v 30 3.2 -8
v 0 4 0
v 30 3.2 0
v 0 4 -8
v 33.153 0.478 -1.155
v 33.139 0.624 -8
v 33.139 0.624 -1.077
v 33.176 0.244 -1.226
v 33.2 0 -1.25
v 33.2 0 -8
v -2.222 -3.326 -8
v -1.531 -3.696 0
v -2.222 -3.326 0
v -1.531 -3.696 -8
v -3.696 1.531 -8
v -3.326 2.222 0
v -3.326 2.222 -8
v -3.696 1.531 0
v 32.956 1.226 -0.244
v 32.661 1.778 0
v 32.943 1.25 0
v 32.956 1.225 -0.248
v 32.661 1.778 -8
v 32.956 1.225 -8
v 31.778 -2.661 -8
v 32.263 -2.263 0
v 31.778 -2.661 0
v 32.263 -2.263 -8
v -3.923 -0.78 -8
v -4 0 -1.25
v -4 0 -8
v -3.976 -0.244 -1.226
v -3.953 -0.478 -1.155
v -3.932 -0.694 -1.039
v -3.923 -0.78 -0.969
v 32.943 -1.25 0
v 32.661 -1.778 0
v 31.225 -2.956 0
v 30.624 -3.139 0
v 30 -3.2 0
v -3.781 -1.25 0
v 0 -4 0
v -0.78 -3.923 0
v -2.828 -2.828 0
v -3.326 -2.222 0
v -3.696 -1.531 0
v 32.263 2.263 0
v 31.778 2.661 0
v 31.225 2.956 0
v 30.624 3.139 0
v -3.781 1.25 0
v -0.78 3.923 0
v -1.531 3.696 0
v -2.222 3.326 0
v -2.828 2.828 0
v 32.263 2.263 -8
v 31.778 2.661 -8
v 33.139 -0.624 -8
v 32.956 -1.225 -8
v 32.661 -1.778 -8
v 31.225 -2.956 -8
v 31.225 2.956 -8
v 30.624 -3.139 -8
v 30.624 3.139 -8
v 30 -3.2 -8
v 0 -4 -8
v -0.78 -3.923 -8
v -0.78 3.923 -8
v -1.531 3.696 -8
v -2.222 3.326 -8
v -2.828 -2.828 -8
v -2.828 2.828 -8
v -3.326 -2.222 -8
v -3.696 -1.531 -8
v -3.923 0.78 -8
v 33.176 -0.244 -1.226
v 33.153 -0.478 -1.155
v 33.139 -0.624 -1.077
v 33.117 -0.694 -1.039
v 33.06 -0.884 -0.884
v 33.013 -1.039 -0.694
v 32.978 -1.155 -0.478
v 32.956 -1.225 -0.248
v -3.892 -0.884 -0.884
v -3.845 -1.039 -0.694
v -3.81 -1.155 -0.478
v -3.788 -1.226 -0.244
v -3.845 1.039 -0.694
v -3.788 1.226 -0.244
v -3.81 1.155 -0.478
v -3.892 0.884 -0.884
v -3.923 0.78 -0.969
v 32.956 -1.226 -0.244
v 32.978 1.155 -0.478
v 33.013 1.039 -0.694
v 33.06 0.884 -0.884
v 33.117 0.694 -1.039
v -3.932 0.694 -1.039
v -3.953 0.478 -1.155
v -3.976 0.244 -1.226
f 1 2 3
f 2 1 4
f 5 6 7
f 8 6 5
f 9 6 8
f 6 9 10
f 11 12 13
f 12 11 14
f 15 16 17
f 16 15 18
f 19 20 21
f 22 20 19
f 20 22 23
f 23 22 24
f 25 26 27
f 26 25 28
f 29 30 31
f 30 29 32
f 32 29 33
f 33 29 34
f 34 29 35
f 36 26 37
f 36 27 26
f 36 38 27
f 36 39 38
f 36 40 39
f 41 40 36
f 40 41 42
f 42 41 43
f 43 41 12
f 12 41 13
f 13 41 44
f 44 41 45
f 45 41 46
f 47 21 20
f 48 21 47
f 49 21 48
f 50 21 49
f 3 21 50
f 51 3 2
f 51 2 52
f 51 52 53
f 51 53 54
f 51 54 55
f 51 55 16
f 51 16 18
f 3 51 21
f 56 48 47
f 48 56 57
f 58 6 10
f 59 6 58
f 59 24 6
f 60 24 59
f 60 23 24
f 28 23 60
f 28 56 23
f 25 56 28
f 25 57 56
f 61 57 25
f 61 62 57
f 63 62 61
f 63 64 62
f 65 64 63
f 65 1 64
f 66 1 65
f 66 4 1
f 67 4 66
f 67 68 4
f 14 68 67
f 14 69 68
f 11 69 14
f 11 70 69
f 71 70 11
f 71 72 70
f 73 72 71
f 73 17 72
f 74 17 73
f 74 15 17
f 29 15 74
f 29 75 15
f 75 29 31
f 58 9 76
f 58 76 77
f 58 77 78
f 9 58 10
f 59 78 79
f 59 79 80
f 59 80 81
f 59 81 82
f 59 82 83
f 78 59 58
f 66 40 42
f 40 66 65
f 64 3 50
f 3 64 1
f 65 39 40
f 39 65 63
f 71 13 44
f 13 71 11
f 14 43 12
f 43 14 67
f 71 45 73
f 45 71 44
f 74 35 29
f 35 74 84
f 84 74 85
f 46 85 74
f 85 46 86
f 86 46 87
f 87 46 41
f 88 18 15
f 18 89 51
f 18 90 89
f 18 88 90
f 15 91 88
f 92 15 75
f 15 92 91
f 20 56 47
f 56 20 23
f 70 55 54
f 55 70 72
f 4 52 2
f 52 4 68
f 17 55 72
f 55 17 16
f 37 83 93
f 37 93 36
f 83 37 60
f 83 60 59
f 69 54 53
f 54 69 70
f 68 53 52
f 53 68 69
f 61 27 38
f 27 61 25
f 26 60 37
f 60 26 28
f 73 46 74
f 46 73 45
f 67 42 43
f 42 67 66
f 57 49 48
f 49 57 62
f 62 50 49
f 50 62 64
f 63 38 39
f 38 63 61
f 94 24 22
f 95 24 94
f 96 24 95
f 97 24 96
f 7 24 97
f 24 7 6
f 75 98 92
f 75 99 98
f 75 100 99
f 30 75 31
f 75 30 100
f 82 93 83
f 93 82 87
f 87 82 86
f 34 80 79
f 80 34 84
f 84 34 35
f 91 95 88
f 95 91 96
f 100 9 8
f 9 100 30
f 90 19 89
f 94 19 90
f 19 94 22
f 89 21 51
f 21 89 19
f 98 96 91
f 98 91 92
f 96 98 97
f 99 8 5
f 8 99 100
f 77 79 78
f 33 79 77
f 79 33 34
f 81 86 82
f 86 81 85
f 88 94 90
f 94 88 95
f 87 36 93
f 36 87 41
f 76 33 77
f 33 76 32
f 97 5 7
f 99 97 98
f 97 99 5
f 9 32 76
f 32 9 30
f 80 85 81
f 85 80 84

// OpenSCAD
// COBRA Finger Segment - DISTAL
// Length: 30.0mm, Width: 8mm

$fn = 32;

module finger_segment() {
    difference() {
        hull() {
            translate([0, 0, -4])
            cylinder(h=8, d=8, center=true);
            
            translate([30.0, 0, -4])
            cylinder(h=8, d=6.4, center=true);
        }
        
        // Tendon channel
        translate([15.0, 0, 0])
        rotate([0, 90, 0])
        cylinder(h=32.0, d=2.5, center=true);
        
        // Pivot holes
        translate([0, 0, 0])
        rotate([0, 90, 0])
        cylinder(h=10, d=2.5, center=true);
        
        translate([30.0, 0, 0])
        rotate([0, 90, 0])
        cylinder(h=10, d=2.5, center=true);
    }
}

finger_segment();
